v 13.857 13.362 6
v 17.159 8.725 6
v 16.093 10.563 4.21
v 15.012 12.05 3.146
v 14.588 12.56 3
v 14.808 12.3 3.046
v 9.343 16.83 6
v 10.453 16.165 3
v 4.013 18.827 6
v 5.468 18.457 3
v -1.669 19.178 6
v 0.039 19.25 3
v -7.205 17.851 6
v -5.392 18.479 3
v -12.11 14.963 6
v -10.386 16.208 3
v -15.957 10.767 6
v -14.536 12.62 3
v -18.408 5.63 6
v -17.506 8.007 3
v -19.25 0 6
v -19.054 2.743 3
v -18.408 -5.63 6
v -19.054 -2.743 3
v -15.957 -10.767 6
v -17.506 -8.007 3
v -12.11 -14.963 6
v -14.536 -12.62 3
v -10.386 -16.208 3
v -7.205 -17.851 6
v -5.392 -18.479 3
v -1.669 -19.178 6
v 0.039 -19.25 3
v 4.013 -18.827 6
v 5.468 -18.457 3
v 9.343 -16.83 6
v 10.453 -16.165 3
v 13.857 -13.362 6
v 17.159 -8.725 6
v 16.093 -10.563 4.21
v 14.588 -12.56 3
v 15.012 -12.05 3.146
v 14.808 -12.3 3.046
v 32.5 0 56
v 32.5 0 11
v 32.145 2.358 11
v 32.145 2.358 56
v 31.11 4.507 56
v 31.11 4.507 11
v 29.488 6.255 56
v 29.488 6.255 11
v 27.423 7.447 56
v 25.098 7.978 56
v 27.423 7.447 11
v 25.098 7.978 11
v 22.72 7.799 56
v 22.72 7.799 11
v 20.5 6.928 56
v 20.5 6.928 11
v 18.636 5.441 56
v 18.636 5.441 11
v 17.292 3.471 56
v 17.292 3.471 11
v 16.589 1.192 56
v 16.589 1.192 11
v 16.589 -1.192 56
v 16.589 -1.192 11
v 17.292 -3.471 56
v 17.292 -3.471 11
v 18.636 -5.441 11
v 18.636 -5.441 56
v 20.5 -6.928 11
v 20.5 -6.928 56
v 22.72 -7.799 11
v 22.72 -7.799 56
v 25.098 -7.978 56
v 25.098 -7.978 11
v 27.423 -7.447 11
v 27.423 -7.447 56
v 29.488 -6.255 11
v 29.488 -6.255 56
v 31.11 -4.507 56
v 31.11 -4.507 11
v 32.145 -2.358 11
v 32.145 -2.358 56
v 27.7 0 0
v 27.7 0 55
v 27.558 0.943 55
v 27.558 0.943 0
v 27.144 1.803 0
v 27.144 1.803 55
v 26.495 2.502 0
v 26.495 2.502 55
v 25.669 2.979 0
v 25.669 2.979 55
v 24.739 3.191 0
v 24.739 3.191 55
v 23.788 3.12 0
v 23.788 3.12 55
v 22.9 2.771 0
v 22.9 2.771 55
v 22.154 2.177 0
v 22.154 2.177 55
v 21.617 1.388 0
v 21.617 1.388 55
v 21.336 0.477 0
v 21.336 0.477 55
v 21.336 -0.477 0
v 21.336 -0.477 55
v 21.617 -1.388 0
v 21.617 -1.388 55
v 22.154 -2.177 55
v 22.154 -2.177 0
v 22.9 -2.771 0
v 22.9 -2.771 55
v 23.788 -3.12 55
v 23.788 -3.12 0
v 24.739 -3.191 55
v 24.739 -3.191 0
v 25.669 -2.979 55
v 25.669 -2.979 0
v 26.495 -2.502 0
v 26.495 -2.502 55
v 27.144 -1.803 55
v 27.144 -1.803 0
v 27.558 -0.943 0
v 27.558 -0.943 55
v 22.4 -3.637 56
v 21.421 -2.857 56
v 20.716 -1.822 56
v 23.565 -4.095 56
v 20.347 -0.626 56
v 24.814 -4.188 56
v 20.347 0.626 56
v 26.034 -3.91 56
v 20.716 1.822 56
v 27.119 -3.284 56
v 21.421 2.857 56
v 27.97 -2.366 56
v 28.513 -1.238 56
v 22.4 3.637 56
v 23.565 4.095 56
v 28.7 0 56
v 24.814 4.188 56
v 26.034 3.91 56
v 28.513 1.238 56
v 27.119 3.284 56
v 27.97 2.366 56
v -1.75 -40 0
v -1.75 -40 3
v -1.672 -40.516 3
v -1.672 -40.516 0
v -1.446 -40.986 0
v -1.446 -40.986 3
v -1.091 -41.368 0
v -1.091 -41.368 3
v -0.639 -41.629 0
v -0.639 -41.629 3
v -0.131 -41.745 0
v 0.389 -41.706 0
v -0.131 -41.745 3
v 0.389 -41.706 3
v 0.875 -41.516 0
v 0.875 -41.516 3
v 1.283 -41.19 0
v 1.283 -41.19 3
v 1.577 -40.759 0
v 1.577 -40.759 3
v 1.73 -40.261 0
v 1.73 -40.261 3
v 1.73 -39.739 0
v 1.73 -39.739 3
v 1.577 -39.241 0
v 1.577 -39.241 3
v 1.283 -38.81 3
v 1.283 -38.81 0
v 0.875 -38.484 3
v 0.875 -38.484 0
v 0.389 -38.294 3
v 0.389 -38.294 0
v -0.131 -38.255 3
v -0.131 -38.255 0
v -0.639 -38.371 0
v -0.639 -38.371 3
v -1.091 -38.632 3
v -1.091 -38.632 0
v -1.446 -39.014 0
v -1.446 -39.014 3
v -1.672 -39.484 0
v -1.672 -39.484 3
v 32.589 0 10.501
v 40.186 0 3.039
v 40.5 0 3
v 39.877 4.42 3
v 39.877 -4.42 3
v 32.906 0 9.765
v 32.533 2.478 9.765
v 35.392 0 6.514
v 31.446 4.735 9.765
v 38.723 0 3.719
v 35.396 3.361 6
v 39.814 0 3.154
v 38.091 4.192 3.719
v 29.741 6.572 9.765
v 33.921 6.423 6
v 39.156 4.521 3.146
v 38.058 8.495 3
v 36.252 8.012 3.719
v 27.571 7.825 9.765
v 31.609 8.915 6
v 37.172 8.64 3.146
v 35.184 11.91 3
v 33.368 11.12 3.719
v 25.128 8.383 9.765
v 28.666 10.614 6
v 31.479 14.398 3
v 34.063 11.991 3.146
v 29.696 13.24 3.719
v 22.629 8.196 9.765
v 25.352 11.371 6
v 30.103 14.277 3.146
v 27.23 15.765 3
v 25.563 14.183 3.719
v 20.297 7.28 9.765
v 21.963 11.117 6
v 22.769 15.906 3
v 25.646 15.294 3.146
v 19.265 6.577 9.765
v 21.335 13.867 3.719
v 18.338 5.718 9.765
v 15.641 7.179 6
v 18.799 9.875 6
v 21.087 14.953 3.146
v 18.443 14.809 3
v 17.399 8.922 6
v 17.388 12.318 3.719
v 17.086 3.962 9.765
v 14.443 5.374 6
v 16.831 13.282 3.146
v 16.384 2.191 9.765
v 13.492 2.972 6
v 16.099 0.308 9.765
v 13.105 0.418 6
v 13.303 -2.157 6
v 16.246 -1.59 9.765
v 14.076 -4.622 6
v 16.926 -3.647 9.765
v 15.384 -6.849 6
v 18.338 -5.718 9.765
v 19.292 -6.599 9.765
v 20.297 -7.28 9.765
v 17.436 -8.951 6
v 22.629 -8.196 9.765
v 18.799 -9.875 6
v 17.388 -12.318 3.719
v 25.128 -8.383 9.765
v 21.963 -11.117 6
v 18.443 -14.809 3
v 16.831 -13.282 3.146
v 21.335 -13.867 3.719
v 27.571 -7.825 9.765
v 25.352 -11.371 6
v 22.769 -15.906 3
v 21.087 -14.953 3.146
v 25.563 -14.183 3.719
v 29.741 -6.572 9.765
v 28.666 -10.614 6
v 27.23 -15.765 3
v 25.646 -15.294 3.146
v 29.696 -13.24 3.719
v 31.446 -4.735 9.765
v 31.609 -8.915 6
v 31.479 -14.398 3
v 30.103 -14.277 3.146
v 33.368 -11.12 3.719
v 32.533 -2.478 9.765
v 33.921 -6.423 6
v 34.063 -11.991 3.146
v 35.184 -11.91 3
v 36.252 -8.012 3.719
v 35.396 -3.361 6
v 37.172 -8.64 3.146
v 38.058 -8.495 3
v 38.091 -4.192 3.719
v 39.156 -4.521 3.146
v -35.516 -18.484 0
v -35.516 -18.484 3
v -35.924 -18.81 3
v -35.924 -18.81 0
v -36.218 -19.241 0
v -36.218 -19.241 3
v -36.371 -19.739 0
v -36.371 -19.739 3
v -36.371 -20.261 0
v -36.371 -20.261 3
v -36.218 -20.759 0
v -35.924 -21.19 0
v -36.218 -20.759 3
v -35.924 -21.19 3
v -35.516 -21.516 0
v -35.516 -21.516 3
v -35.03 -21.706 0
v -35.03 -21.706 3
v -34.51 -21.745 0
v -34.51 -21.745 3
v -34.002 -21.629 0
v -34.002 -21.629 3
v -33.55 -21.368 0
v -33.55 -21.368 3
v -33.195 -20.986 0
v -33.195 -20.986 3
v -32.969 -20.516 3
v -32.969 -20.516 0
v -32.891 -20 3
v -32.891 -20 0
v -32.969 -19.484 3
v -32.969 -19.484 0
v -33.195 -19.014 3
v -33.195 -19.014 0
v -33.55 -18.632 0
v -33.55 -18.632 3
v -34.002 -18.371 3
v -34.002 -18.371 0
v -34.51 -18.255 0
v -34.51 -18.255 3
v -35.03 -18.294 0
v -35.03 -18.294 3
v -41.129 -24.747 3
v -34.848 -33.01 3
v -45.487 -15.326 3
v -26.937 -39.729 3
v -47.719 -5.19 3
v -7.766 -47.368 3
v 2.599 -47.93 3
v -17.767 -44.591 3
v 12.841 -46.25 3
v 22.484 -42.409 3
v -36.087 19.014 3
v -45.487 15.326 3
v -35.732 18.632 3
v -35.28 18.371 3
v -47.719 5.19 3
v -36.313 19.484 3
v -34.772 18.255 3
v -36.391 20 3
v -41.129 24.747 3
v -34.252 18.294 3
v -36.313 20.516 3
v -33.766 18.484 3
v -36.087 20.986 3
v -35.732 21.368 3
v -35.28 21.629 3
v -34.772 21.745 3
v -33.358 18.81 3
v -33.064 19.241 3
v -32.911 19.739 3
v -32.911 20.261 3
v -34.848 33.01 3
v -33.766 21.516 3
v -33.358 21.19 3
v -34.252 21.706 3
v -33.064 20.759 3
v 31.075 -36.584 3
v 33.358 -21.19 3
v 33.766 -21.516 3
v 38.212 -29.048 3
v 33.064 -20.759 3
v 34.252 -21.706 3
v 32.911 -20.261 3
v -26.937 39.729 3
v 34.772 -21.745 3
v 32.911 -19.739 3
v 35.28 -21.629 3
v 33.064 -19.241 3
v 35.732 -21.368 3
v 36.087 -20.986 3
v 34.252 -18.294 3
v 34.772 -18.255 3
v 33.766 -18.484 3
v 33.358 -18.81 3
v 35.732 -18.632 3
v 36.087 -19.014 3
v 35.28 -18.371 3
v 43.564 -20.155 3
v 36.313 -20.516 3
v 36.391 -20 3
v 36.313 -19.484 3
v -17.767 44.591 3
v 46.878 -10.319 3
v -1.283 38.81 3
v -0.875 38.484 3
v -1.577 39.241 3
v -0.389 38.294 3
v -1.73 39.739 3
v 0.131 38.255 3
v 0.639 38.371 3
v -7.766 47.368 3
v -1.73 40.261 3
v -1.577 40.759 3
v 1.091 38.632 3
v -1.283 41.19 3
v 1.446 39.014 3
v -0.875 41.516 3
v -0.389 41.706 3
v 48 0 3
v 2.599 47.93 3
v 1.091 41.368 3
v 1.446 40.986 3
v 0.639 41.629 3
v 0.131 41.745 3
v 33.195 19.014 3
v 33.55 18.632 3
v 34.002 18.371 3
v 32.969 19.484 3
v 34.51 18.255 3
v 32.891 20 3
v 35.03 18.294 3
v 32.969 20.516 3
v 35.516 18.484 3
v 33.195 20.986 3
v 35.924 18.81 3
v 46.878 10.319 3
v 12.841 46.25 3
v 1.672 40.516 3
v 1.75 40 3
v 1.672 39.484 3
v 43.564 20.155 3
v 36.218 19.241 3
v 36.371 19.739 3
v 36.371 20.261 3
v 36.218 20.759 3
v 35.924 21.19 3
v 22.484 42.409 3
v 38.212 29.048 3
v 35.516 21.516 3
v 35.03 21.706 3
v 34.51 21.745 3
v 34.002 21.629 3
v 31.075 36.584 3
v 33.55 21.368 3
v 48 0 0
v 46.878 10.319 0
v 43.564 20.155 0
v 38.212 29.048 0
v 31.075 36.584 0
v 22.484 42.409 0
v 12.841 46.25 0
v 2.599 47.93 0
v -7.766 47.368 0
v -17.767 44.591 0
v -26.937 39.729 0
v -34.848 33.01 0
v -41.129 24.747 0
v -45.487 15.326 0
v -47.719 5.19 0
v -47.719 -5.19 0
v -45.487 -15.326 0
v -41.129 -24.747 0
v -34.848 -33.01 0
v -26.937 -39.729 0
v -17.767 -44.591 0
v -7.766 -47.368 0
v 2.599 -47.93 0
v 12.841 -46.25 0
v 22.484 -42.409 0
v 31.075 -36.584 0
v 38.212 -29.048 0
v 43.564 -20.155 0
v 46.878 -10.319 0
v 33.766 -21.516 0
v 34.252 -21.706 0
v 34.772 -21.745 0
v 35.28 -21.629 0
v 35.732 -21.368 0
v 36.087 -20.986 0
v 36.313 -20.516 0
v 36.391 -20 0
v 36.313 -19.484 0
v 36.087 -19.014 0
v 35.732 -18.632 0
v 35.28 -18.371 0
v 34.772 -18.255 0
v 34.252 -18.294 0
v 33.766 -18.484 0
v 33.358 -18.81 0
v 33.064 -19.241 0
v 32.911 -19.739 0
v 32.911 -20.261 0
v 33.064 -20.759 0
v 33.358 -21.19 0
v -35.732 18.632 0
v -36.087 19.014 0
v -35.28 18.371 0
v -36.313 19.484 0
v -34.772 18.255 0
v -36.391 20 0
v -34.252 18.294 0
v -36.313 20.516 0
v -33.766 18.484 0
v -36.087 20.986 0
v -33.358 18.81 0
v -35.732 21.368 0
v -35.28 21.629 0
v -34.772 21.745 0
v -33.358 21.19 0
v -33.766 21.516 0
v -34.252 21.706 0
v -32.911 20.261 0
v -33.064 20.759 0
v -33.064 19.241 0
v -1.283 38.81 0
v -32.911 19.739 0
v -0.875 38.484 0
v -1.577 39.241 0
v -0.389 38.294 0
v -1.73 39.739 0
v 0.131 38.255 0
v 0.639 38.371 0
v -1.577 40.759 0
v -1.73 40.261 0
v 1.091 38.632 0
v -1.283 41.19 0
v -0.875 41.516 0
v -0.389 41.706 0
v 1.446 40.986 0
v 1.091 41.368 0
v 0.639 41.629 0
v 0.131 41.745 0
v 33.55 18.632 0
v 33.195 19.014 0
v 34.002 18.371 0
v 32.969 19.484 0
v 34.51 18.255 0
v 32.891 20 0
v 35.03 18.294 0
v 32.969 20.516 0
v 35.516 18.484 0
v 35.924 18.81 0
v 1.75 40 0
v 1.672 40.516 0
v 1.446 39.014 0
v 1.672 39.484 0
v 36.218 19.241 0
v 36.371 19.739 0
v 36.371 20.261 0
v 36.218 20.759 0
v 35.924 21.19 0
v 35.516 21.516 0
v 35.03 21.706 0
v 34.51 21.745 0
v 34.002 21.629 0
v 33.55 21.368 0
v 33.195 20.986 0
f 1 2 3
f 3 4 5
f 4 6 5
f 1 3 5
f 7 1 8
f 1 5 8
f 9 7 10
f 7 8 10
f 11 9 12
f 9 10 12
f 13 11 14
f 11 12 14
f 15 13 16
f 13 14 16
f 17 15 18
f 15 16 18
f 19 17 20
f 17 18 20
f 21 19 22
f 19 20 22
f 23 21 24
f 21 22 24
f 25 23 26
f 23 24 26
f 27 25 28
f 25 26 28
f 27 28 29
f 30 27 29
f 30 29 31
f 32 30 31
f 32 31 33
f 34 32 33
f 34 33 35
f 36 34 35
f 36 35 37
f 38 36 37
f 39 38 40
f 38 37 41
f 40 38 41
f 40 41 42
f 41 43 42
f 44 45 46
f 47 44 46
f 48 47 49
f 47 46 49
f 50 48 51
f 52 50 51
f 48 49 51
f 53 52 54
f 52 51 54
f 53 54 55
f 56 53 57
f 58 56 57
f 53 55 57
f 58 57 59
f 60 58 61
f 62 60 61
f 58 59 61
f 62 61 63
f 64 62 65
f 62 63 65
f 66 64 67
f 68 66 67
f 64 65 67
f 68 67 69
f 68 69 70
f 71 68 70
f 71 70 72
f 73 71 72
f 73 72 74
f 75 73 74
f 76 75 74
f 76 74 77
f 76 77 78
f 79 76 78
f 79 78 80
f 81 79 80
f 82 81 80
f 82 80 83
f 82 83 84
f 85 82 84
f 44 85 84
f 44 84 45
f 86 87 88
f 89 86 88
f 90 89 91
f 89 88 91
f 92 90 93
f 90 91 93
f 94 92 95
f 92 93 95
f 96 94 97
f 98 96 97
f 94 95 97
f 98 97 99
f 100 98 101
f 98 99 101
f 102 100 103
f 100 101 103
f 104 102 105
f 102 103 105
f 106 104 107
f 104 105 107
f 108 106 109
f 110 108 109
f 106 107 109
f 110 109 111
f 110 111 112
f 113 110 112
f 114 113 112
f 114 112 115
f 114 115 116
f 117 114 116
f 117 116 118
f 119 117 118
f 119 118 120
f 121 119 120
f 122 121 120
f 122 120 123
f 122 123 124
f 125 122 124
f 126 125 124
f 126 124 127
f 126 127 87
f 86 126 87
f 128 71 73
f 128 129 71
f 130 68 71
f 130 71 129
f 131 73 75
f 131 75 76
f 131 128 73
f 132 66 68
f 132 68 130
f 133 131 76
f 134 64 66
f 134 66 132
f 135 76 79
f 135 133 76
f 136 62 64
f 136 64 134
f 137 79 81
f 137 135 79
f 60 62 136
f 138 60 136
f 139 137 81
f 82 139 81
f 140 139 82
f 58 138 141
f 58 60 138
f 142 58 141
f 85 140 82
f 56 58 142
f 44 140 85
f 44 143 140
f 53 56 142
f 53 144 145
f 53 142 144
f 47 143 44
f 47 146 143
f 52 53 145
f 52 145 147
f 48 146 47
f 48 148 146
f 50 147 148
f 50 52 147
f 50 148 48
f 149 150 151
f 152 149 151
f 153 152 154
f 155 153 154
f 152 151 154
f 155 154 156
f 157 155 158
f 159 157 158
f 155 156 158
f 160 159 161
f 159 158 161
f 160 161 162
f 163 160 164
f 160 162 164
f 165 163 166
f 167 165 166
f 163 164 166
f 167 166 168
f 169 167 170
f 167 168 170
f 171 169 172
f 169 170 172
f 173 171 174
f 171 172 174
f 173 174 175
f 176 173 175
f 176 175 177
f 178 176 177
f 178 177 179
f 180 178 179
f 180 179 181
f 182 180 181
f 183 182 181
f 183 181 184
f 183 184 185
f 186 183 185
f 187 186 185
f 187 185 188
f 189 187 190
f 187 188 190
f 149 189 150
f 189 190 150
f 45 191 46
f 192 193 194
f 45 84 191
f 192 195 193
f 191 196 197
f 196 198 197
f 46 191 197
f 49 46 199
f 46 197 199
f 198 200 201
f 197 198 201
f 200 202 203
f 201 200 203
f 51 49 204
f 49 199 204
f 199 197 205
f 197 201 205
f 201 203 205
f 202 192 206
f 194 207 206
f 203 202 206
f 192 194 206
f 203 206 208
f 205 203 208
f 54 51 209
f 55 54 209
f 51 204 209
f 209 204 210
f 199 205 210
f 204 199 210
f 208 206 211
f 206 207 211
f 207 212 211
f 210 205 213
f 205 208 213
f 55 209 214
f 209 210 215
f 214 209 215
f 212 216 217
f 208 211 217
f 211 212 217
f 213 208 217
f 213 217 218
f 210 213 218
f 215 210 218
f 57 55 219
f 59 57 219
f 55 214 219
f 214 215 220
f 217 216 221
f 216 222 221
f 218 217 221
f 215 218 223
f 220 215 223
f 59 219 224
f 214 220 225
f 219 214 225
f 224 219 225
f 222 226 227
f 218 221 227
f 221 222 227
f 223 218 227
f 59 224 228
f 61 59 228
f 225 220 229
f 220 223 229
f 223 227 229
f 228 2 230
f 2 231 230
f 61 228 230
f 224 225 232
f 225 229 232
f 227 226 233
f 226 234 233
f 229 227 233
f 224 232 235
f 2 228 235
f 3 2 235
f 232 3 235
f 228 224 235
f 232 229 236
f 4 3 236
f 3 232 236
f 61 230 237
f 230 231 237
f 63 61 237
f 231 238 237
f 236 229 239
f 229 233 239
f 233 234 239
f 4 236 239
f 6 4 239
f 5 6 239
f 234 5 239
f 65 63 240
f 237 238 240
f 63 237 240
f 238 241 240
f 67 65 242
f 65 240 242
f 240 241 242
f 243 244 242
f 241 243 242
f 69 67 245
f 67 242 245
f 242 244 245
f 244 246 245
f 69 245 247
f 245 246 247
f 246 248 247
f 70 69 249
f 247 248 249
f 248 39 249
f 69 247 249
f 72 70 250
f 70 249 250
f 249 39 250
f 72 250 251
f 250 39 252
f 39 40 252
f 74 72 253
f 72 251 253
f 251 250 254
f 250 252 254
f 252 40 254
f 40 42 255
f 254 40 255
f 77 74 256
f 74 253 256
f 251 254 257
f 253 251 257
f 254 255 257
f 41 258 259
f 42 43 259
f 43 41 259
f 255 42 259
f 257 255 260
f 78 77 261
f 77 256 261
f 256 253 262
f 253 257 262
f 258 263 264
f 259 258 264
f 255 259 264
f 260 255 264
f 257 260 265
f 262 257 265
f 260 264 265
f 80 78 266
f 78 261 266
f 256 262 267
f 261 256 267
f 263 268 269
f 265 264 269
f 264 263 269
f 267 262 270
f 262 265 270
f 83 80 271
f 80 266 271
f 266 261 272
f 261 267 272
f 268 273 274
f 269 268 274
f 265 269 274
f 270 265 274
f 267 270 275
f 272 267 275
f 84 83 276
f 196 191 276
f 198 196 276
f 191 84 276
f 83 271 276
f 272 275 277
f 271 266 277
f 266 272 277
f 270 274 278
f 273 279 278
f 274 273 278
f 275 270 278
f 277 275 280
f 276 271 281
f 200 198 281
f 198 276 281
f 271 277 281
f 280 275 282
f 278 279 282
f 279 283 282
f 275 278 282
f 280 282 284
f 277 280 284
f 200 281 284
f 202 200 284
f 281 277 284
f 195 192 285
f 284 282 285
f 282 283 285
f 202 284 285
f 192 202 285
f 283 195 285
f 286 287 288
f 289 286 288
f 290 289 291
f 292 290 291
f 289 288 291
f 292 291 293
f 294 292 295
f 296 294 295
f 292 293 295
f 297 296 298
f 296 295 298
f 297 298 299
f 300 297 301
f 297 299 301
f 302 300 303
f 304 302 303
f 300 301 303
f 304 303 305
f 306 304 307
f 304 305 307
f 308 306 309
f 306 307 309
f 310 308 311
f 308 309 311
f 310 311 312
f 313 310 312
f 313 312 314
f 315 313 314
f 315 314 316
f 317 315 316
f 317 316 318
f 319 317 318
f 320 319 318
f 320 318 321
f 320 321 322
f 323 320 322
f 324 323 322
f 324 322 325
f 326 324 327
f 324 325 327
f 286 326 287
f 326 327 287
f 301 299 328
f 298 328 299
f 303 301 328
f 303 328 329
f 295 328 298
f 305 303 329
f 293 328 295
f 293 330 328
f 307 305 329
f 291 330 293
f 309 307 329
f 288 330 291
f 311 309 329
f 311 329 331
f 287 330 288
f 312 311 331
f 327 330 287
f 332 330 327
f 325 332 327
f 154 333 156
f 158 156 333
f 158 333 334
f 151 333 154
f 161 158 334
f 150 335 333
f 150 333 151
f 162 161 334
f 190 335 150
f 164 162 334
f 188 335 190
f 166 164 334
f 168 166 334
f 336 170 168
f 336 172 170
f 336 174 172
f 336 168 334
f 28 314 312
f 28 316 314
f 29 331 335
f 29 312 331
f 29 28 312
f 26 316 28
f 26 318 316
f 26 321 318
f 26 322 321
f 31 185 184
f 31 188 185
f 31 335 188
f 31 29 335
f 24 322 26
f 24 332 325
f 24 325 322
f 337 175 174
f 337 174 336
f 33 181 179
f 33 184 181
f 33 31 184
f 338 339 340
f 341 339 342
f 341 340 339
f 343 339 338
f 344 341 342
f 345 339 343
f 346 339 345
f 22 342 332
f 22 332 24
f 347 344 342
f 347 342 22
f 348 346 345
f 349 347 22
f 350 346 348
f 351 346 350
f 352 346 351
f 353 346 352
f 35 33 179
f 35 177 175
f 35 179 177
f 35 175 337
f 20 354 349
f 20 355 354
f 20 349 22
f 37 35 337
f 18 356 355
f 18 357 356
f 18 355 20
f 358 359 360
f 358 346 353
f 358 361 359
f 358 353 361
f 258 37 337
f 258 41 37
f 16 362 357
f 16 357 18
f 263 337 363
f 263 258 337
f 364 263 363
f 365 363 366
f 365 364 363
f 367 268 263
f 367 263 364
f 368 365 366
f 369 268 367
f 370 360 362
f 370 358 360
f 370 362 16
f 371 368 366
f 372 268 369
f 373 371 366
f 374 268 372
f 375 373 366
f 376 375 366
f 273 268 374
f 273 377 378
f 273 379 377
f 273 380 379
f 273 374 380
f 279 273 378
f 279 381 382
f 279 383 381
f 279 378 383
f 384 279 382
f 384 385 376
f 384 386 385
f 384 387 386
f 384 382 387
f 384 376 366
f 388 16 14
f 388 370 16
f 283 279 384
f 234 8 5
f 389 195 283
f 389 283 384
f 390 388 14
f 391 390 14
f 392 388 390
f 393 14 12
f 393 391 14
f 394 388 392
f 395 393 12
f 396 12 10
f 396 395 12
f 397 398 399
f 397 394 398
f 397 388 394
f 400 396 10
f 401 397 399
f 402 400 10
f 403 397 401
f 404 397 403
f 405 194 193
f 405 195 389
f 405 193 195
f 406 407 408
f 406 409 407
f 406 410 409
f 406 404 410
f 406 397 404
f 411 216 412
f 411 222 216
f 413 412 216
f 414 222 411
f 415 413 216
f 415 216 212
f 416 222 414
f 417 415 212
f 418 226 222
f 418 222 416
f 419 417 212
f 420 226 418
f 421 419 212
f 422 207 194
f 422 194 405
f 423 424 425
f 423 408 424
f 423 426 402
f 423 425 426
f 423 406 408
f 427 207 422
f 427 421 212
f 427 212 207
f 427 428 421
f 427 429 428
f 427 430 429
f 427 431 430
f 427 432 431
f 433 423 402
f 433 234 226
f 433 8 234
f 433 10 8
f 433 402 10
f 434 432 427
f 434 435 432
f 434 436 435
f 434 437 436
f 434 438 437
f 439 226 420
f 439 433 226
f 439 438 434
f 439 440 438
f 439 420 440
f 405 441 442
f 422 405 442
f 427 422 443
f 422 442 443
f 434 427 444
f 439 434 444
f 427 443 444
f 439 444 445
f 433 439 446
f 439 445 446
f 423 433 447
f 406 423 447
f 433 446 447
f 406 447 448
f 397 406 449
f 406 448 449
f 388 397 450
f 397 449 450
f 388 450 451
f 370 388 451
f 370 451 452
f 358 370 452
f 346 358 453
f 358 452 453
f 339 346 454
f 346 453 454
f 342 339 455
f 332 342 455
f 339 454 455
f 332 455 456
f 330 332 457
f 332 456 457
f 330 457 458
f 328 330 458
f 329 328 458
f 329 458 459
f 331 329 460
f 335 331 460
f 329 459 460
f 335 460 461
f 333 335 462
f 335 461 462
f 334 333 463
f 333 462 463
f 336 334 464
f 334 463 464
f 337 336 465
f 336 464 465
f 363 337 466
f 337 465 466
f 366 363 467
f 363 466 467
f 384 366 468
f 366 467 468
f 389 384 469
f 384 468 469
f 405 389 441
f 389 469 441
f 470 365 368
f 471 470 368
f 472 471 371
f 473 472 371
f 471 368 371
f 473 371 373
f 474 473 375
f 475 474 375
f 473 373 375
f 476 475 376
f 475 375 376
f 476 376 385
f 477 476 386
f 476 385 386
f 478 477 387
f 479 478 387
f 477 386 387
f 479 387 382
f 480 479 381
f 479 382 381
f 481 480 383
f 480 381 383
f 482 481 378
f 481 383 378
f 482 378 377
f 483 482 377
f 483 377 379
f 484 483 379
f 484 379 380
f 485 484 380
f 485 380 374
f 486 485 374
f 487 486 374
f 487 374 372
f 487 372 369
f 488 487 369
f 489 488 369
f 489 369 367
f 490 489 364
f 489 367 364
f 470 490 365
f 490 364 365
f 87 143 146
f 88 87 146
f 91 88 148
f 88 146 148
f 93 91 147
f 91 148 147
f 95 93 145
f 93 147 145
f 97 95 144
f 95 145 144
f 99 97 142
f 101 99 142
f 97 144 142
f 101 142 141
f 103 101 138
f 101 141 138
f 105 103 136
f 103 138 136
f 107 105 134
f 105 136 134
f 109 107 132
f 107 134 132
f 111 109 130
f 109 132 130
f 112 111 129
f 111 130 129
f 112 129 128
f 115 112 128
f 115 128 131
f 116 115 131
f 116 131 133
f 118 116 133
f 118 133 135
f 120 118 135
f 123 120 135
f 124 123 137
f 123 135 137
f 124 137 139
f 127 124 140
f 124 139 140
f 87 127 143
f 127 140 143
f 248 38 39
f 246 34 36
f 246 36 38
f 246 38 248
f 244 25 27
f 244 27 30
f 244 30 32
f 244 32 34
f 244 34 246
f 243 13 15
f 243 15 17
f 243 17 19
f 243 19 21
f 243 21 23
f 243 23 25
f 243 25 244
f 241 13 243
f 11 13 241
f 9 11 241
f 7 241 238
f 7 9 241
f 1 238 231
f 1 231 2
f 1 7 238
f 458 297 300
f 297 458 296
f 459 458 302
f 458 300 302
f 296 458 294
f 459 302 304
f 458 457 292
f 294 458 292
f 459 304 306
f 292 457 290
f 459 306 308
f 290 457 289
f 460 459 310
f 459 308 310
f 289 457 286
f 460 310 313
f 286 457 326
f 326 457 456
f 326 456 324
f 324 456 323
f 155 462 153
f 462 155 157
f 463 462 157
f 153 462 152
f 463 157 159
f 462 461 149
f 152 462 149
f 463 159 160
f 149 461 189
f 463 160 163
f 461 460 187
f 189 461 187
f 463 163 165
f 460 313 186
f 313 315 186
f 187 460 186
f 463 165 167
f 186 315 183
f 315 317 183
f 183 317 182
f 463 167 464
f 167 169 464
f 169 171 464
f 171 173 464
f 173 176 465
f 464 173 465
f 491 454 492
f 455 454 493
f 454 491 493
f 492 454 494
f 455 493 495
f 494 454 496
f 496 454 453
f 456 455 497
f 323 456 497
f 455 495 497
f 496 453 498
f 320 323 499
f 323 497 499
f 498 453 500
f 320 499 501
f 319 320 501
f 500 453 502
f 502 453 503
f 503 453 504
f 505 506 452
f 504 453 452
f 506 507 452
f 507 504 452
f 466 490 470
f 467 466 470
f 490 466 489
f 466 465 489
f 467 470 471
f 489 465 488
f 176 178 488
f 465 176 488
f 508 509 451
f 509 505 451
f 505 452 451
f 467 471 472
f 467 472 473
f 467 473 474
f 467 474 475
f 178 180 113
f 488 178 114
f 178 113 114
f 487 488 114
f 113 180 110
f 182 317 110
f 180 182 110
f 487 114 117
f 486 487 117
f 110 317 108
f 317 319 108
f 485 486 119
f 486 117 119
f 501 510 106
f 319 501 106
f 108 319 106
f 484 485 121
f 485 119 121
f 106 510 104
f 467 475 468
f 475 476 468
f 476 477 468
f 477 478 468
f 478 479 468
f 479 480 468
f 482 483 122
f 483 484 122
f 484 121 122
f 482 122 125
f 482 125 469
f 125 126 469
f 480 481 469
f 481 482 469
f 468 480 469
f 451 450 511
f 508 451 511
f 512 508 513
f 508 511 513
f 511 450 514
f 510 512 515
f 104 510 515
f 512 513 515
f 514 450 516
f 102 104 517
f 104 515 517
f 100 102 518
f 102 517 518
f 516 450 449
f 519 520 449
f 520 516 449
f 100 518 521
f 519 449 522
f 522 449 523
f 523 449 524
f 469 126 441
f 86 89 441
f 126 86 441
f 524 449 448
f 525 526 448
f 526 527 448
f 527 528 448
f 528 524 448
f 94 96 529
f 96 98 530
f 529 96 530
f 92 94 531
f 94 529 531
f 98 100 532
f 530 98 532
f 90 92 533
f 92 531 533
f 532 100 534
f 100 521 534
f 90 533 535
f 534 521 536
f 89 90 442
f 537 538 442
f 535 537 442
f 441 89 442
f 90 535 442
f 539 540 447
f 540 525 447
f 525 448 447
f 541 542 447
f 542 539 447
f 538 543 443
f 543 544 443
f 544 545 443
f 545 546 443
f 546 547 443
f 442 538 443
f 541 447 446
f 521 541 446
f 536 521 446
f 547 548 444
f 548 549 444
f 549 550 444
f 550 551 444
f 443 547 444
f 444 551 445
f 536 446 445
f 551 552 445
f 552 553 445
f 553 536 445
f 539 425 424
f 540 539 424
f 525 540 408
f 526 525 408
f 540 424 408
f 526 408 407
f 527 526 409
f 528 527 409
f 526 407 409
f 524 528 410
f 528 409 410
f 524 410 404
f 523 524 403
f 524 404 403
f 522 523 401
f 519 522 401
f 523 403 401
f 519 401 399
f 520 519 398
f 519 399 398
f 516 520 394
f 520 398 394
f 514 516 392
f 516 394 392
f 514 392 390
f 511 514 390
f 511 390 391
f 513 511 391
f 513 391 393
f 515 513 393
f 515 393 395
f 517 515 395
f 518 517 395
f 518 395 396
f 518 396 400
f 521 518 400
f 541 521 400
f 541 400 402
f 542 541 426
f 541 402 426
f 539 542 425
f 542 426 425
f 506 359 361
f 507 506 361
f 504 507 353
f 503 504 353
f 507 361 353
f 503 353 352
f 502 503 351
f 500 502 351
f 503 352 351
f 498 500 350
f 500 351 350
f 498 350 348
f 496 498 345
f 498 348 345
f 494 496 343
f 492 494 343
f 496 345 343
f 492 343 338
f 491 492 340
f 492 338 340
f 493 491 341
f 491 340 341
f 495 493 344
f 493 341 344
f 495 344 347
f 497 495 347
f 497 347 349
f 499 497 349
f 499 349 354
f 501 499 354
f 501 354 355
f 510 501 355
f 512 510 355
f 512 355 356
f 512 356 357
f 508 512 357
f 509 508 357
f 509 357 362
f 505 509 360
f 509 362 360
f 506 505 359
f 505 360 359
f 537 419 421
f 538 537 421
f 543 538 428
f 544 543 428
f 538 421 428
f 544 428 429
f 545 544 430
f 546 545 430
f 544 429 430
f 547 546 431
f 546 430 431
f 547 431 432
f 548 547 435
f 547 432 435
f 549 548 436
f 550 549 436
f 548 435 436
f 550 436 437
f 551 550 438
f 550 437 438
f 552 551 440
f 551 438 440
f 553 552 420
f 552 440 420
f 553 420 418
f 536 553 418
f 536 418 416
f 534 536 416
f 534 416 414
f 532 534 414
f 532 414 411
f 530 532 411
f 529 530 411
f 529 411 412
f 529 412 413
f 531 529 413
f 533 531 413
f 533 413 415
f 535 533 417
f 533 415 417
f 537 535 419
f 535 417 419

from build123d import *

# Parameters (mm, degrees)
SKETCH1_R           = 48
BOSS_EXTRUDE1_DEPTH = 3
SKETCH2_R           = 1.75
CUT_EXTRUDE1_DEPTH  = 3
CIRPATTERN1_COUNT   = 6
SKETCH3_R           = 8
BOSS_EXTRUDE2_DEPTH = 53
SKETCH4_R           = 3.2
CUT_EXTRUDE2_DEPTH  = 89
CHAMFER1_SIZE       = 1
FILLET1_SIZE        = 8
SKETCH5_R           = 19.25
BOSS_EXTRUDE3_DEPTH = 3


with BuildPart() as part:
    # Sketch1 → Boss-Extrude1 (new body)
    with BuildSketch(Plane.XY):
        Circle(SKETCH1_R)
    extrude(amount=BOSS_EXTRUDE1_DEPTH)

    # Sketch2 → Cut-Extrude1 (cut)
    with BuildSketch(Plane.XY.offset(3)):
        with Locations((0, 40)):
            Circle(SKETCH2_R)
    cut_extrude1 = extrude(amount=-CUT_EXTRUDE1_DEPTH, mode=Mode.SUBTRACT)

    # CirPattern1: Cut-Extrude1 ×6 about axis
    cirpattern1_axis = Axis((0, 0, 0), (0, 0, 1))
    for i in range(1, CIRPATTERN1_COUNT):
        add(cut_extrude1.rotate(cirpattern1_axis, i * 360 / CIRPATTERN1_COUNT), mode=Mode.SUBTRACT)

    # Sketch3 → Boss-Extrude2 (add)
    with BuildSketch(Plane.XY.offset(3)):
        with Locations((24.5, 0)):
            Circle(SKETCH3_R)
    extrude(amount=BOSS_EXTRUDE2_DEPTH)

    # Sketch4 → Cut-Extrude2 (cut, through all)
    with BuildSketch(Plane.XY.offset(56)):
        with Locations((24.5, 0)):
            Circle(SKETCH4_R)
    extrude(amount=-CUT_EXTRUDE2_DEPTH, mode=Mode.SUBTRACT)

    # Chamfer1
    chamfer1_edges = [part.edges().sort_by_distance(p)[0] for p in [
        (21.3, 0, 56),
    ]]
    chamfer(chamfer1_edges, length=CHAMFER1_SIZE)

    # Fillet1
    # a fillet whose section is not a circle: 8 mm, written as the material it adds along each edge
    with BuildSketch(Plane(origin=(24.5, 0, 3), x_dir=(1, 0, 0), z_dir=(0, -1, 0))) as fillet1_piece_1:
        with BuildLine():
            Bezier((8, FILLET1_SIZE), (8, 0), (8 + FILLET1_SIZE, 0), weights=[1, 0.25, 1])
            Line((8 + FILLET1_SIZE, 0), (8, 0))
            Line((8, 0), (8, FILLET1_SIZE))
        make_face()
    revolve(axis=Axis((24.5, 0, 3), (0, 0, 1)))

    # Sketch5 → Boss-Extrude3 (add)
    with BuildSketch(Plane.XY.offset(3)):
        Circle(SKETCH5_R)
    extrude(amount=BOSS_EXTRUDE3_DEPTH)


solid = part.part
